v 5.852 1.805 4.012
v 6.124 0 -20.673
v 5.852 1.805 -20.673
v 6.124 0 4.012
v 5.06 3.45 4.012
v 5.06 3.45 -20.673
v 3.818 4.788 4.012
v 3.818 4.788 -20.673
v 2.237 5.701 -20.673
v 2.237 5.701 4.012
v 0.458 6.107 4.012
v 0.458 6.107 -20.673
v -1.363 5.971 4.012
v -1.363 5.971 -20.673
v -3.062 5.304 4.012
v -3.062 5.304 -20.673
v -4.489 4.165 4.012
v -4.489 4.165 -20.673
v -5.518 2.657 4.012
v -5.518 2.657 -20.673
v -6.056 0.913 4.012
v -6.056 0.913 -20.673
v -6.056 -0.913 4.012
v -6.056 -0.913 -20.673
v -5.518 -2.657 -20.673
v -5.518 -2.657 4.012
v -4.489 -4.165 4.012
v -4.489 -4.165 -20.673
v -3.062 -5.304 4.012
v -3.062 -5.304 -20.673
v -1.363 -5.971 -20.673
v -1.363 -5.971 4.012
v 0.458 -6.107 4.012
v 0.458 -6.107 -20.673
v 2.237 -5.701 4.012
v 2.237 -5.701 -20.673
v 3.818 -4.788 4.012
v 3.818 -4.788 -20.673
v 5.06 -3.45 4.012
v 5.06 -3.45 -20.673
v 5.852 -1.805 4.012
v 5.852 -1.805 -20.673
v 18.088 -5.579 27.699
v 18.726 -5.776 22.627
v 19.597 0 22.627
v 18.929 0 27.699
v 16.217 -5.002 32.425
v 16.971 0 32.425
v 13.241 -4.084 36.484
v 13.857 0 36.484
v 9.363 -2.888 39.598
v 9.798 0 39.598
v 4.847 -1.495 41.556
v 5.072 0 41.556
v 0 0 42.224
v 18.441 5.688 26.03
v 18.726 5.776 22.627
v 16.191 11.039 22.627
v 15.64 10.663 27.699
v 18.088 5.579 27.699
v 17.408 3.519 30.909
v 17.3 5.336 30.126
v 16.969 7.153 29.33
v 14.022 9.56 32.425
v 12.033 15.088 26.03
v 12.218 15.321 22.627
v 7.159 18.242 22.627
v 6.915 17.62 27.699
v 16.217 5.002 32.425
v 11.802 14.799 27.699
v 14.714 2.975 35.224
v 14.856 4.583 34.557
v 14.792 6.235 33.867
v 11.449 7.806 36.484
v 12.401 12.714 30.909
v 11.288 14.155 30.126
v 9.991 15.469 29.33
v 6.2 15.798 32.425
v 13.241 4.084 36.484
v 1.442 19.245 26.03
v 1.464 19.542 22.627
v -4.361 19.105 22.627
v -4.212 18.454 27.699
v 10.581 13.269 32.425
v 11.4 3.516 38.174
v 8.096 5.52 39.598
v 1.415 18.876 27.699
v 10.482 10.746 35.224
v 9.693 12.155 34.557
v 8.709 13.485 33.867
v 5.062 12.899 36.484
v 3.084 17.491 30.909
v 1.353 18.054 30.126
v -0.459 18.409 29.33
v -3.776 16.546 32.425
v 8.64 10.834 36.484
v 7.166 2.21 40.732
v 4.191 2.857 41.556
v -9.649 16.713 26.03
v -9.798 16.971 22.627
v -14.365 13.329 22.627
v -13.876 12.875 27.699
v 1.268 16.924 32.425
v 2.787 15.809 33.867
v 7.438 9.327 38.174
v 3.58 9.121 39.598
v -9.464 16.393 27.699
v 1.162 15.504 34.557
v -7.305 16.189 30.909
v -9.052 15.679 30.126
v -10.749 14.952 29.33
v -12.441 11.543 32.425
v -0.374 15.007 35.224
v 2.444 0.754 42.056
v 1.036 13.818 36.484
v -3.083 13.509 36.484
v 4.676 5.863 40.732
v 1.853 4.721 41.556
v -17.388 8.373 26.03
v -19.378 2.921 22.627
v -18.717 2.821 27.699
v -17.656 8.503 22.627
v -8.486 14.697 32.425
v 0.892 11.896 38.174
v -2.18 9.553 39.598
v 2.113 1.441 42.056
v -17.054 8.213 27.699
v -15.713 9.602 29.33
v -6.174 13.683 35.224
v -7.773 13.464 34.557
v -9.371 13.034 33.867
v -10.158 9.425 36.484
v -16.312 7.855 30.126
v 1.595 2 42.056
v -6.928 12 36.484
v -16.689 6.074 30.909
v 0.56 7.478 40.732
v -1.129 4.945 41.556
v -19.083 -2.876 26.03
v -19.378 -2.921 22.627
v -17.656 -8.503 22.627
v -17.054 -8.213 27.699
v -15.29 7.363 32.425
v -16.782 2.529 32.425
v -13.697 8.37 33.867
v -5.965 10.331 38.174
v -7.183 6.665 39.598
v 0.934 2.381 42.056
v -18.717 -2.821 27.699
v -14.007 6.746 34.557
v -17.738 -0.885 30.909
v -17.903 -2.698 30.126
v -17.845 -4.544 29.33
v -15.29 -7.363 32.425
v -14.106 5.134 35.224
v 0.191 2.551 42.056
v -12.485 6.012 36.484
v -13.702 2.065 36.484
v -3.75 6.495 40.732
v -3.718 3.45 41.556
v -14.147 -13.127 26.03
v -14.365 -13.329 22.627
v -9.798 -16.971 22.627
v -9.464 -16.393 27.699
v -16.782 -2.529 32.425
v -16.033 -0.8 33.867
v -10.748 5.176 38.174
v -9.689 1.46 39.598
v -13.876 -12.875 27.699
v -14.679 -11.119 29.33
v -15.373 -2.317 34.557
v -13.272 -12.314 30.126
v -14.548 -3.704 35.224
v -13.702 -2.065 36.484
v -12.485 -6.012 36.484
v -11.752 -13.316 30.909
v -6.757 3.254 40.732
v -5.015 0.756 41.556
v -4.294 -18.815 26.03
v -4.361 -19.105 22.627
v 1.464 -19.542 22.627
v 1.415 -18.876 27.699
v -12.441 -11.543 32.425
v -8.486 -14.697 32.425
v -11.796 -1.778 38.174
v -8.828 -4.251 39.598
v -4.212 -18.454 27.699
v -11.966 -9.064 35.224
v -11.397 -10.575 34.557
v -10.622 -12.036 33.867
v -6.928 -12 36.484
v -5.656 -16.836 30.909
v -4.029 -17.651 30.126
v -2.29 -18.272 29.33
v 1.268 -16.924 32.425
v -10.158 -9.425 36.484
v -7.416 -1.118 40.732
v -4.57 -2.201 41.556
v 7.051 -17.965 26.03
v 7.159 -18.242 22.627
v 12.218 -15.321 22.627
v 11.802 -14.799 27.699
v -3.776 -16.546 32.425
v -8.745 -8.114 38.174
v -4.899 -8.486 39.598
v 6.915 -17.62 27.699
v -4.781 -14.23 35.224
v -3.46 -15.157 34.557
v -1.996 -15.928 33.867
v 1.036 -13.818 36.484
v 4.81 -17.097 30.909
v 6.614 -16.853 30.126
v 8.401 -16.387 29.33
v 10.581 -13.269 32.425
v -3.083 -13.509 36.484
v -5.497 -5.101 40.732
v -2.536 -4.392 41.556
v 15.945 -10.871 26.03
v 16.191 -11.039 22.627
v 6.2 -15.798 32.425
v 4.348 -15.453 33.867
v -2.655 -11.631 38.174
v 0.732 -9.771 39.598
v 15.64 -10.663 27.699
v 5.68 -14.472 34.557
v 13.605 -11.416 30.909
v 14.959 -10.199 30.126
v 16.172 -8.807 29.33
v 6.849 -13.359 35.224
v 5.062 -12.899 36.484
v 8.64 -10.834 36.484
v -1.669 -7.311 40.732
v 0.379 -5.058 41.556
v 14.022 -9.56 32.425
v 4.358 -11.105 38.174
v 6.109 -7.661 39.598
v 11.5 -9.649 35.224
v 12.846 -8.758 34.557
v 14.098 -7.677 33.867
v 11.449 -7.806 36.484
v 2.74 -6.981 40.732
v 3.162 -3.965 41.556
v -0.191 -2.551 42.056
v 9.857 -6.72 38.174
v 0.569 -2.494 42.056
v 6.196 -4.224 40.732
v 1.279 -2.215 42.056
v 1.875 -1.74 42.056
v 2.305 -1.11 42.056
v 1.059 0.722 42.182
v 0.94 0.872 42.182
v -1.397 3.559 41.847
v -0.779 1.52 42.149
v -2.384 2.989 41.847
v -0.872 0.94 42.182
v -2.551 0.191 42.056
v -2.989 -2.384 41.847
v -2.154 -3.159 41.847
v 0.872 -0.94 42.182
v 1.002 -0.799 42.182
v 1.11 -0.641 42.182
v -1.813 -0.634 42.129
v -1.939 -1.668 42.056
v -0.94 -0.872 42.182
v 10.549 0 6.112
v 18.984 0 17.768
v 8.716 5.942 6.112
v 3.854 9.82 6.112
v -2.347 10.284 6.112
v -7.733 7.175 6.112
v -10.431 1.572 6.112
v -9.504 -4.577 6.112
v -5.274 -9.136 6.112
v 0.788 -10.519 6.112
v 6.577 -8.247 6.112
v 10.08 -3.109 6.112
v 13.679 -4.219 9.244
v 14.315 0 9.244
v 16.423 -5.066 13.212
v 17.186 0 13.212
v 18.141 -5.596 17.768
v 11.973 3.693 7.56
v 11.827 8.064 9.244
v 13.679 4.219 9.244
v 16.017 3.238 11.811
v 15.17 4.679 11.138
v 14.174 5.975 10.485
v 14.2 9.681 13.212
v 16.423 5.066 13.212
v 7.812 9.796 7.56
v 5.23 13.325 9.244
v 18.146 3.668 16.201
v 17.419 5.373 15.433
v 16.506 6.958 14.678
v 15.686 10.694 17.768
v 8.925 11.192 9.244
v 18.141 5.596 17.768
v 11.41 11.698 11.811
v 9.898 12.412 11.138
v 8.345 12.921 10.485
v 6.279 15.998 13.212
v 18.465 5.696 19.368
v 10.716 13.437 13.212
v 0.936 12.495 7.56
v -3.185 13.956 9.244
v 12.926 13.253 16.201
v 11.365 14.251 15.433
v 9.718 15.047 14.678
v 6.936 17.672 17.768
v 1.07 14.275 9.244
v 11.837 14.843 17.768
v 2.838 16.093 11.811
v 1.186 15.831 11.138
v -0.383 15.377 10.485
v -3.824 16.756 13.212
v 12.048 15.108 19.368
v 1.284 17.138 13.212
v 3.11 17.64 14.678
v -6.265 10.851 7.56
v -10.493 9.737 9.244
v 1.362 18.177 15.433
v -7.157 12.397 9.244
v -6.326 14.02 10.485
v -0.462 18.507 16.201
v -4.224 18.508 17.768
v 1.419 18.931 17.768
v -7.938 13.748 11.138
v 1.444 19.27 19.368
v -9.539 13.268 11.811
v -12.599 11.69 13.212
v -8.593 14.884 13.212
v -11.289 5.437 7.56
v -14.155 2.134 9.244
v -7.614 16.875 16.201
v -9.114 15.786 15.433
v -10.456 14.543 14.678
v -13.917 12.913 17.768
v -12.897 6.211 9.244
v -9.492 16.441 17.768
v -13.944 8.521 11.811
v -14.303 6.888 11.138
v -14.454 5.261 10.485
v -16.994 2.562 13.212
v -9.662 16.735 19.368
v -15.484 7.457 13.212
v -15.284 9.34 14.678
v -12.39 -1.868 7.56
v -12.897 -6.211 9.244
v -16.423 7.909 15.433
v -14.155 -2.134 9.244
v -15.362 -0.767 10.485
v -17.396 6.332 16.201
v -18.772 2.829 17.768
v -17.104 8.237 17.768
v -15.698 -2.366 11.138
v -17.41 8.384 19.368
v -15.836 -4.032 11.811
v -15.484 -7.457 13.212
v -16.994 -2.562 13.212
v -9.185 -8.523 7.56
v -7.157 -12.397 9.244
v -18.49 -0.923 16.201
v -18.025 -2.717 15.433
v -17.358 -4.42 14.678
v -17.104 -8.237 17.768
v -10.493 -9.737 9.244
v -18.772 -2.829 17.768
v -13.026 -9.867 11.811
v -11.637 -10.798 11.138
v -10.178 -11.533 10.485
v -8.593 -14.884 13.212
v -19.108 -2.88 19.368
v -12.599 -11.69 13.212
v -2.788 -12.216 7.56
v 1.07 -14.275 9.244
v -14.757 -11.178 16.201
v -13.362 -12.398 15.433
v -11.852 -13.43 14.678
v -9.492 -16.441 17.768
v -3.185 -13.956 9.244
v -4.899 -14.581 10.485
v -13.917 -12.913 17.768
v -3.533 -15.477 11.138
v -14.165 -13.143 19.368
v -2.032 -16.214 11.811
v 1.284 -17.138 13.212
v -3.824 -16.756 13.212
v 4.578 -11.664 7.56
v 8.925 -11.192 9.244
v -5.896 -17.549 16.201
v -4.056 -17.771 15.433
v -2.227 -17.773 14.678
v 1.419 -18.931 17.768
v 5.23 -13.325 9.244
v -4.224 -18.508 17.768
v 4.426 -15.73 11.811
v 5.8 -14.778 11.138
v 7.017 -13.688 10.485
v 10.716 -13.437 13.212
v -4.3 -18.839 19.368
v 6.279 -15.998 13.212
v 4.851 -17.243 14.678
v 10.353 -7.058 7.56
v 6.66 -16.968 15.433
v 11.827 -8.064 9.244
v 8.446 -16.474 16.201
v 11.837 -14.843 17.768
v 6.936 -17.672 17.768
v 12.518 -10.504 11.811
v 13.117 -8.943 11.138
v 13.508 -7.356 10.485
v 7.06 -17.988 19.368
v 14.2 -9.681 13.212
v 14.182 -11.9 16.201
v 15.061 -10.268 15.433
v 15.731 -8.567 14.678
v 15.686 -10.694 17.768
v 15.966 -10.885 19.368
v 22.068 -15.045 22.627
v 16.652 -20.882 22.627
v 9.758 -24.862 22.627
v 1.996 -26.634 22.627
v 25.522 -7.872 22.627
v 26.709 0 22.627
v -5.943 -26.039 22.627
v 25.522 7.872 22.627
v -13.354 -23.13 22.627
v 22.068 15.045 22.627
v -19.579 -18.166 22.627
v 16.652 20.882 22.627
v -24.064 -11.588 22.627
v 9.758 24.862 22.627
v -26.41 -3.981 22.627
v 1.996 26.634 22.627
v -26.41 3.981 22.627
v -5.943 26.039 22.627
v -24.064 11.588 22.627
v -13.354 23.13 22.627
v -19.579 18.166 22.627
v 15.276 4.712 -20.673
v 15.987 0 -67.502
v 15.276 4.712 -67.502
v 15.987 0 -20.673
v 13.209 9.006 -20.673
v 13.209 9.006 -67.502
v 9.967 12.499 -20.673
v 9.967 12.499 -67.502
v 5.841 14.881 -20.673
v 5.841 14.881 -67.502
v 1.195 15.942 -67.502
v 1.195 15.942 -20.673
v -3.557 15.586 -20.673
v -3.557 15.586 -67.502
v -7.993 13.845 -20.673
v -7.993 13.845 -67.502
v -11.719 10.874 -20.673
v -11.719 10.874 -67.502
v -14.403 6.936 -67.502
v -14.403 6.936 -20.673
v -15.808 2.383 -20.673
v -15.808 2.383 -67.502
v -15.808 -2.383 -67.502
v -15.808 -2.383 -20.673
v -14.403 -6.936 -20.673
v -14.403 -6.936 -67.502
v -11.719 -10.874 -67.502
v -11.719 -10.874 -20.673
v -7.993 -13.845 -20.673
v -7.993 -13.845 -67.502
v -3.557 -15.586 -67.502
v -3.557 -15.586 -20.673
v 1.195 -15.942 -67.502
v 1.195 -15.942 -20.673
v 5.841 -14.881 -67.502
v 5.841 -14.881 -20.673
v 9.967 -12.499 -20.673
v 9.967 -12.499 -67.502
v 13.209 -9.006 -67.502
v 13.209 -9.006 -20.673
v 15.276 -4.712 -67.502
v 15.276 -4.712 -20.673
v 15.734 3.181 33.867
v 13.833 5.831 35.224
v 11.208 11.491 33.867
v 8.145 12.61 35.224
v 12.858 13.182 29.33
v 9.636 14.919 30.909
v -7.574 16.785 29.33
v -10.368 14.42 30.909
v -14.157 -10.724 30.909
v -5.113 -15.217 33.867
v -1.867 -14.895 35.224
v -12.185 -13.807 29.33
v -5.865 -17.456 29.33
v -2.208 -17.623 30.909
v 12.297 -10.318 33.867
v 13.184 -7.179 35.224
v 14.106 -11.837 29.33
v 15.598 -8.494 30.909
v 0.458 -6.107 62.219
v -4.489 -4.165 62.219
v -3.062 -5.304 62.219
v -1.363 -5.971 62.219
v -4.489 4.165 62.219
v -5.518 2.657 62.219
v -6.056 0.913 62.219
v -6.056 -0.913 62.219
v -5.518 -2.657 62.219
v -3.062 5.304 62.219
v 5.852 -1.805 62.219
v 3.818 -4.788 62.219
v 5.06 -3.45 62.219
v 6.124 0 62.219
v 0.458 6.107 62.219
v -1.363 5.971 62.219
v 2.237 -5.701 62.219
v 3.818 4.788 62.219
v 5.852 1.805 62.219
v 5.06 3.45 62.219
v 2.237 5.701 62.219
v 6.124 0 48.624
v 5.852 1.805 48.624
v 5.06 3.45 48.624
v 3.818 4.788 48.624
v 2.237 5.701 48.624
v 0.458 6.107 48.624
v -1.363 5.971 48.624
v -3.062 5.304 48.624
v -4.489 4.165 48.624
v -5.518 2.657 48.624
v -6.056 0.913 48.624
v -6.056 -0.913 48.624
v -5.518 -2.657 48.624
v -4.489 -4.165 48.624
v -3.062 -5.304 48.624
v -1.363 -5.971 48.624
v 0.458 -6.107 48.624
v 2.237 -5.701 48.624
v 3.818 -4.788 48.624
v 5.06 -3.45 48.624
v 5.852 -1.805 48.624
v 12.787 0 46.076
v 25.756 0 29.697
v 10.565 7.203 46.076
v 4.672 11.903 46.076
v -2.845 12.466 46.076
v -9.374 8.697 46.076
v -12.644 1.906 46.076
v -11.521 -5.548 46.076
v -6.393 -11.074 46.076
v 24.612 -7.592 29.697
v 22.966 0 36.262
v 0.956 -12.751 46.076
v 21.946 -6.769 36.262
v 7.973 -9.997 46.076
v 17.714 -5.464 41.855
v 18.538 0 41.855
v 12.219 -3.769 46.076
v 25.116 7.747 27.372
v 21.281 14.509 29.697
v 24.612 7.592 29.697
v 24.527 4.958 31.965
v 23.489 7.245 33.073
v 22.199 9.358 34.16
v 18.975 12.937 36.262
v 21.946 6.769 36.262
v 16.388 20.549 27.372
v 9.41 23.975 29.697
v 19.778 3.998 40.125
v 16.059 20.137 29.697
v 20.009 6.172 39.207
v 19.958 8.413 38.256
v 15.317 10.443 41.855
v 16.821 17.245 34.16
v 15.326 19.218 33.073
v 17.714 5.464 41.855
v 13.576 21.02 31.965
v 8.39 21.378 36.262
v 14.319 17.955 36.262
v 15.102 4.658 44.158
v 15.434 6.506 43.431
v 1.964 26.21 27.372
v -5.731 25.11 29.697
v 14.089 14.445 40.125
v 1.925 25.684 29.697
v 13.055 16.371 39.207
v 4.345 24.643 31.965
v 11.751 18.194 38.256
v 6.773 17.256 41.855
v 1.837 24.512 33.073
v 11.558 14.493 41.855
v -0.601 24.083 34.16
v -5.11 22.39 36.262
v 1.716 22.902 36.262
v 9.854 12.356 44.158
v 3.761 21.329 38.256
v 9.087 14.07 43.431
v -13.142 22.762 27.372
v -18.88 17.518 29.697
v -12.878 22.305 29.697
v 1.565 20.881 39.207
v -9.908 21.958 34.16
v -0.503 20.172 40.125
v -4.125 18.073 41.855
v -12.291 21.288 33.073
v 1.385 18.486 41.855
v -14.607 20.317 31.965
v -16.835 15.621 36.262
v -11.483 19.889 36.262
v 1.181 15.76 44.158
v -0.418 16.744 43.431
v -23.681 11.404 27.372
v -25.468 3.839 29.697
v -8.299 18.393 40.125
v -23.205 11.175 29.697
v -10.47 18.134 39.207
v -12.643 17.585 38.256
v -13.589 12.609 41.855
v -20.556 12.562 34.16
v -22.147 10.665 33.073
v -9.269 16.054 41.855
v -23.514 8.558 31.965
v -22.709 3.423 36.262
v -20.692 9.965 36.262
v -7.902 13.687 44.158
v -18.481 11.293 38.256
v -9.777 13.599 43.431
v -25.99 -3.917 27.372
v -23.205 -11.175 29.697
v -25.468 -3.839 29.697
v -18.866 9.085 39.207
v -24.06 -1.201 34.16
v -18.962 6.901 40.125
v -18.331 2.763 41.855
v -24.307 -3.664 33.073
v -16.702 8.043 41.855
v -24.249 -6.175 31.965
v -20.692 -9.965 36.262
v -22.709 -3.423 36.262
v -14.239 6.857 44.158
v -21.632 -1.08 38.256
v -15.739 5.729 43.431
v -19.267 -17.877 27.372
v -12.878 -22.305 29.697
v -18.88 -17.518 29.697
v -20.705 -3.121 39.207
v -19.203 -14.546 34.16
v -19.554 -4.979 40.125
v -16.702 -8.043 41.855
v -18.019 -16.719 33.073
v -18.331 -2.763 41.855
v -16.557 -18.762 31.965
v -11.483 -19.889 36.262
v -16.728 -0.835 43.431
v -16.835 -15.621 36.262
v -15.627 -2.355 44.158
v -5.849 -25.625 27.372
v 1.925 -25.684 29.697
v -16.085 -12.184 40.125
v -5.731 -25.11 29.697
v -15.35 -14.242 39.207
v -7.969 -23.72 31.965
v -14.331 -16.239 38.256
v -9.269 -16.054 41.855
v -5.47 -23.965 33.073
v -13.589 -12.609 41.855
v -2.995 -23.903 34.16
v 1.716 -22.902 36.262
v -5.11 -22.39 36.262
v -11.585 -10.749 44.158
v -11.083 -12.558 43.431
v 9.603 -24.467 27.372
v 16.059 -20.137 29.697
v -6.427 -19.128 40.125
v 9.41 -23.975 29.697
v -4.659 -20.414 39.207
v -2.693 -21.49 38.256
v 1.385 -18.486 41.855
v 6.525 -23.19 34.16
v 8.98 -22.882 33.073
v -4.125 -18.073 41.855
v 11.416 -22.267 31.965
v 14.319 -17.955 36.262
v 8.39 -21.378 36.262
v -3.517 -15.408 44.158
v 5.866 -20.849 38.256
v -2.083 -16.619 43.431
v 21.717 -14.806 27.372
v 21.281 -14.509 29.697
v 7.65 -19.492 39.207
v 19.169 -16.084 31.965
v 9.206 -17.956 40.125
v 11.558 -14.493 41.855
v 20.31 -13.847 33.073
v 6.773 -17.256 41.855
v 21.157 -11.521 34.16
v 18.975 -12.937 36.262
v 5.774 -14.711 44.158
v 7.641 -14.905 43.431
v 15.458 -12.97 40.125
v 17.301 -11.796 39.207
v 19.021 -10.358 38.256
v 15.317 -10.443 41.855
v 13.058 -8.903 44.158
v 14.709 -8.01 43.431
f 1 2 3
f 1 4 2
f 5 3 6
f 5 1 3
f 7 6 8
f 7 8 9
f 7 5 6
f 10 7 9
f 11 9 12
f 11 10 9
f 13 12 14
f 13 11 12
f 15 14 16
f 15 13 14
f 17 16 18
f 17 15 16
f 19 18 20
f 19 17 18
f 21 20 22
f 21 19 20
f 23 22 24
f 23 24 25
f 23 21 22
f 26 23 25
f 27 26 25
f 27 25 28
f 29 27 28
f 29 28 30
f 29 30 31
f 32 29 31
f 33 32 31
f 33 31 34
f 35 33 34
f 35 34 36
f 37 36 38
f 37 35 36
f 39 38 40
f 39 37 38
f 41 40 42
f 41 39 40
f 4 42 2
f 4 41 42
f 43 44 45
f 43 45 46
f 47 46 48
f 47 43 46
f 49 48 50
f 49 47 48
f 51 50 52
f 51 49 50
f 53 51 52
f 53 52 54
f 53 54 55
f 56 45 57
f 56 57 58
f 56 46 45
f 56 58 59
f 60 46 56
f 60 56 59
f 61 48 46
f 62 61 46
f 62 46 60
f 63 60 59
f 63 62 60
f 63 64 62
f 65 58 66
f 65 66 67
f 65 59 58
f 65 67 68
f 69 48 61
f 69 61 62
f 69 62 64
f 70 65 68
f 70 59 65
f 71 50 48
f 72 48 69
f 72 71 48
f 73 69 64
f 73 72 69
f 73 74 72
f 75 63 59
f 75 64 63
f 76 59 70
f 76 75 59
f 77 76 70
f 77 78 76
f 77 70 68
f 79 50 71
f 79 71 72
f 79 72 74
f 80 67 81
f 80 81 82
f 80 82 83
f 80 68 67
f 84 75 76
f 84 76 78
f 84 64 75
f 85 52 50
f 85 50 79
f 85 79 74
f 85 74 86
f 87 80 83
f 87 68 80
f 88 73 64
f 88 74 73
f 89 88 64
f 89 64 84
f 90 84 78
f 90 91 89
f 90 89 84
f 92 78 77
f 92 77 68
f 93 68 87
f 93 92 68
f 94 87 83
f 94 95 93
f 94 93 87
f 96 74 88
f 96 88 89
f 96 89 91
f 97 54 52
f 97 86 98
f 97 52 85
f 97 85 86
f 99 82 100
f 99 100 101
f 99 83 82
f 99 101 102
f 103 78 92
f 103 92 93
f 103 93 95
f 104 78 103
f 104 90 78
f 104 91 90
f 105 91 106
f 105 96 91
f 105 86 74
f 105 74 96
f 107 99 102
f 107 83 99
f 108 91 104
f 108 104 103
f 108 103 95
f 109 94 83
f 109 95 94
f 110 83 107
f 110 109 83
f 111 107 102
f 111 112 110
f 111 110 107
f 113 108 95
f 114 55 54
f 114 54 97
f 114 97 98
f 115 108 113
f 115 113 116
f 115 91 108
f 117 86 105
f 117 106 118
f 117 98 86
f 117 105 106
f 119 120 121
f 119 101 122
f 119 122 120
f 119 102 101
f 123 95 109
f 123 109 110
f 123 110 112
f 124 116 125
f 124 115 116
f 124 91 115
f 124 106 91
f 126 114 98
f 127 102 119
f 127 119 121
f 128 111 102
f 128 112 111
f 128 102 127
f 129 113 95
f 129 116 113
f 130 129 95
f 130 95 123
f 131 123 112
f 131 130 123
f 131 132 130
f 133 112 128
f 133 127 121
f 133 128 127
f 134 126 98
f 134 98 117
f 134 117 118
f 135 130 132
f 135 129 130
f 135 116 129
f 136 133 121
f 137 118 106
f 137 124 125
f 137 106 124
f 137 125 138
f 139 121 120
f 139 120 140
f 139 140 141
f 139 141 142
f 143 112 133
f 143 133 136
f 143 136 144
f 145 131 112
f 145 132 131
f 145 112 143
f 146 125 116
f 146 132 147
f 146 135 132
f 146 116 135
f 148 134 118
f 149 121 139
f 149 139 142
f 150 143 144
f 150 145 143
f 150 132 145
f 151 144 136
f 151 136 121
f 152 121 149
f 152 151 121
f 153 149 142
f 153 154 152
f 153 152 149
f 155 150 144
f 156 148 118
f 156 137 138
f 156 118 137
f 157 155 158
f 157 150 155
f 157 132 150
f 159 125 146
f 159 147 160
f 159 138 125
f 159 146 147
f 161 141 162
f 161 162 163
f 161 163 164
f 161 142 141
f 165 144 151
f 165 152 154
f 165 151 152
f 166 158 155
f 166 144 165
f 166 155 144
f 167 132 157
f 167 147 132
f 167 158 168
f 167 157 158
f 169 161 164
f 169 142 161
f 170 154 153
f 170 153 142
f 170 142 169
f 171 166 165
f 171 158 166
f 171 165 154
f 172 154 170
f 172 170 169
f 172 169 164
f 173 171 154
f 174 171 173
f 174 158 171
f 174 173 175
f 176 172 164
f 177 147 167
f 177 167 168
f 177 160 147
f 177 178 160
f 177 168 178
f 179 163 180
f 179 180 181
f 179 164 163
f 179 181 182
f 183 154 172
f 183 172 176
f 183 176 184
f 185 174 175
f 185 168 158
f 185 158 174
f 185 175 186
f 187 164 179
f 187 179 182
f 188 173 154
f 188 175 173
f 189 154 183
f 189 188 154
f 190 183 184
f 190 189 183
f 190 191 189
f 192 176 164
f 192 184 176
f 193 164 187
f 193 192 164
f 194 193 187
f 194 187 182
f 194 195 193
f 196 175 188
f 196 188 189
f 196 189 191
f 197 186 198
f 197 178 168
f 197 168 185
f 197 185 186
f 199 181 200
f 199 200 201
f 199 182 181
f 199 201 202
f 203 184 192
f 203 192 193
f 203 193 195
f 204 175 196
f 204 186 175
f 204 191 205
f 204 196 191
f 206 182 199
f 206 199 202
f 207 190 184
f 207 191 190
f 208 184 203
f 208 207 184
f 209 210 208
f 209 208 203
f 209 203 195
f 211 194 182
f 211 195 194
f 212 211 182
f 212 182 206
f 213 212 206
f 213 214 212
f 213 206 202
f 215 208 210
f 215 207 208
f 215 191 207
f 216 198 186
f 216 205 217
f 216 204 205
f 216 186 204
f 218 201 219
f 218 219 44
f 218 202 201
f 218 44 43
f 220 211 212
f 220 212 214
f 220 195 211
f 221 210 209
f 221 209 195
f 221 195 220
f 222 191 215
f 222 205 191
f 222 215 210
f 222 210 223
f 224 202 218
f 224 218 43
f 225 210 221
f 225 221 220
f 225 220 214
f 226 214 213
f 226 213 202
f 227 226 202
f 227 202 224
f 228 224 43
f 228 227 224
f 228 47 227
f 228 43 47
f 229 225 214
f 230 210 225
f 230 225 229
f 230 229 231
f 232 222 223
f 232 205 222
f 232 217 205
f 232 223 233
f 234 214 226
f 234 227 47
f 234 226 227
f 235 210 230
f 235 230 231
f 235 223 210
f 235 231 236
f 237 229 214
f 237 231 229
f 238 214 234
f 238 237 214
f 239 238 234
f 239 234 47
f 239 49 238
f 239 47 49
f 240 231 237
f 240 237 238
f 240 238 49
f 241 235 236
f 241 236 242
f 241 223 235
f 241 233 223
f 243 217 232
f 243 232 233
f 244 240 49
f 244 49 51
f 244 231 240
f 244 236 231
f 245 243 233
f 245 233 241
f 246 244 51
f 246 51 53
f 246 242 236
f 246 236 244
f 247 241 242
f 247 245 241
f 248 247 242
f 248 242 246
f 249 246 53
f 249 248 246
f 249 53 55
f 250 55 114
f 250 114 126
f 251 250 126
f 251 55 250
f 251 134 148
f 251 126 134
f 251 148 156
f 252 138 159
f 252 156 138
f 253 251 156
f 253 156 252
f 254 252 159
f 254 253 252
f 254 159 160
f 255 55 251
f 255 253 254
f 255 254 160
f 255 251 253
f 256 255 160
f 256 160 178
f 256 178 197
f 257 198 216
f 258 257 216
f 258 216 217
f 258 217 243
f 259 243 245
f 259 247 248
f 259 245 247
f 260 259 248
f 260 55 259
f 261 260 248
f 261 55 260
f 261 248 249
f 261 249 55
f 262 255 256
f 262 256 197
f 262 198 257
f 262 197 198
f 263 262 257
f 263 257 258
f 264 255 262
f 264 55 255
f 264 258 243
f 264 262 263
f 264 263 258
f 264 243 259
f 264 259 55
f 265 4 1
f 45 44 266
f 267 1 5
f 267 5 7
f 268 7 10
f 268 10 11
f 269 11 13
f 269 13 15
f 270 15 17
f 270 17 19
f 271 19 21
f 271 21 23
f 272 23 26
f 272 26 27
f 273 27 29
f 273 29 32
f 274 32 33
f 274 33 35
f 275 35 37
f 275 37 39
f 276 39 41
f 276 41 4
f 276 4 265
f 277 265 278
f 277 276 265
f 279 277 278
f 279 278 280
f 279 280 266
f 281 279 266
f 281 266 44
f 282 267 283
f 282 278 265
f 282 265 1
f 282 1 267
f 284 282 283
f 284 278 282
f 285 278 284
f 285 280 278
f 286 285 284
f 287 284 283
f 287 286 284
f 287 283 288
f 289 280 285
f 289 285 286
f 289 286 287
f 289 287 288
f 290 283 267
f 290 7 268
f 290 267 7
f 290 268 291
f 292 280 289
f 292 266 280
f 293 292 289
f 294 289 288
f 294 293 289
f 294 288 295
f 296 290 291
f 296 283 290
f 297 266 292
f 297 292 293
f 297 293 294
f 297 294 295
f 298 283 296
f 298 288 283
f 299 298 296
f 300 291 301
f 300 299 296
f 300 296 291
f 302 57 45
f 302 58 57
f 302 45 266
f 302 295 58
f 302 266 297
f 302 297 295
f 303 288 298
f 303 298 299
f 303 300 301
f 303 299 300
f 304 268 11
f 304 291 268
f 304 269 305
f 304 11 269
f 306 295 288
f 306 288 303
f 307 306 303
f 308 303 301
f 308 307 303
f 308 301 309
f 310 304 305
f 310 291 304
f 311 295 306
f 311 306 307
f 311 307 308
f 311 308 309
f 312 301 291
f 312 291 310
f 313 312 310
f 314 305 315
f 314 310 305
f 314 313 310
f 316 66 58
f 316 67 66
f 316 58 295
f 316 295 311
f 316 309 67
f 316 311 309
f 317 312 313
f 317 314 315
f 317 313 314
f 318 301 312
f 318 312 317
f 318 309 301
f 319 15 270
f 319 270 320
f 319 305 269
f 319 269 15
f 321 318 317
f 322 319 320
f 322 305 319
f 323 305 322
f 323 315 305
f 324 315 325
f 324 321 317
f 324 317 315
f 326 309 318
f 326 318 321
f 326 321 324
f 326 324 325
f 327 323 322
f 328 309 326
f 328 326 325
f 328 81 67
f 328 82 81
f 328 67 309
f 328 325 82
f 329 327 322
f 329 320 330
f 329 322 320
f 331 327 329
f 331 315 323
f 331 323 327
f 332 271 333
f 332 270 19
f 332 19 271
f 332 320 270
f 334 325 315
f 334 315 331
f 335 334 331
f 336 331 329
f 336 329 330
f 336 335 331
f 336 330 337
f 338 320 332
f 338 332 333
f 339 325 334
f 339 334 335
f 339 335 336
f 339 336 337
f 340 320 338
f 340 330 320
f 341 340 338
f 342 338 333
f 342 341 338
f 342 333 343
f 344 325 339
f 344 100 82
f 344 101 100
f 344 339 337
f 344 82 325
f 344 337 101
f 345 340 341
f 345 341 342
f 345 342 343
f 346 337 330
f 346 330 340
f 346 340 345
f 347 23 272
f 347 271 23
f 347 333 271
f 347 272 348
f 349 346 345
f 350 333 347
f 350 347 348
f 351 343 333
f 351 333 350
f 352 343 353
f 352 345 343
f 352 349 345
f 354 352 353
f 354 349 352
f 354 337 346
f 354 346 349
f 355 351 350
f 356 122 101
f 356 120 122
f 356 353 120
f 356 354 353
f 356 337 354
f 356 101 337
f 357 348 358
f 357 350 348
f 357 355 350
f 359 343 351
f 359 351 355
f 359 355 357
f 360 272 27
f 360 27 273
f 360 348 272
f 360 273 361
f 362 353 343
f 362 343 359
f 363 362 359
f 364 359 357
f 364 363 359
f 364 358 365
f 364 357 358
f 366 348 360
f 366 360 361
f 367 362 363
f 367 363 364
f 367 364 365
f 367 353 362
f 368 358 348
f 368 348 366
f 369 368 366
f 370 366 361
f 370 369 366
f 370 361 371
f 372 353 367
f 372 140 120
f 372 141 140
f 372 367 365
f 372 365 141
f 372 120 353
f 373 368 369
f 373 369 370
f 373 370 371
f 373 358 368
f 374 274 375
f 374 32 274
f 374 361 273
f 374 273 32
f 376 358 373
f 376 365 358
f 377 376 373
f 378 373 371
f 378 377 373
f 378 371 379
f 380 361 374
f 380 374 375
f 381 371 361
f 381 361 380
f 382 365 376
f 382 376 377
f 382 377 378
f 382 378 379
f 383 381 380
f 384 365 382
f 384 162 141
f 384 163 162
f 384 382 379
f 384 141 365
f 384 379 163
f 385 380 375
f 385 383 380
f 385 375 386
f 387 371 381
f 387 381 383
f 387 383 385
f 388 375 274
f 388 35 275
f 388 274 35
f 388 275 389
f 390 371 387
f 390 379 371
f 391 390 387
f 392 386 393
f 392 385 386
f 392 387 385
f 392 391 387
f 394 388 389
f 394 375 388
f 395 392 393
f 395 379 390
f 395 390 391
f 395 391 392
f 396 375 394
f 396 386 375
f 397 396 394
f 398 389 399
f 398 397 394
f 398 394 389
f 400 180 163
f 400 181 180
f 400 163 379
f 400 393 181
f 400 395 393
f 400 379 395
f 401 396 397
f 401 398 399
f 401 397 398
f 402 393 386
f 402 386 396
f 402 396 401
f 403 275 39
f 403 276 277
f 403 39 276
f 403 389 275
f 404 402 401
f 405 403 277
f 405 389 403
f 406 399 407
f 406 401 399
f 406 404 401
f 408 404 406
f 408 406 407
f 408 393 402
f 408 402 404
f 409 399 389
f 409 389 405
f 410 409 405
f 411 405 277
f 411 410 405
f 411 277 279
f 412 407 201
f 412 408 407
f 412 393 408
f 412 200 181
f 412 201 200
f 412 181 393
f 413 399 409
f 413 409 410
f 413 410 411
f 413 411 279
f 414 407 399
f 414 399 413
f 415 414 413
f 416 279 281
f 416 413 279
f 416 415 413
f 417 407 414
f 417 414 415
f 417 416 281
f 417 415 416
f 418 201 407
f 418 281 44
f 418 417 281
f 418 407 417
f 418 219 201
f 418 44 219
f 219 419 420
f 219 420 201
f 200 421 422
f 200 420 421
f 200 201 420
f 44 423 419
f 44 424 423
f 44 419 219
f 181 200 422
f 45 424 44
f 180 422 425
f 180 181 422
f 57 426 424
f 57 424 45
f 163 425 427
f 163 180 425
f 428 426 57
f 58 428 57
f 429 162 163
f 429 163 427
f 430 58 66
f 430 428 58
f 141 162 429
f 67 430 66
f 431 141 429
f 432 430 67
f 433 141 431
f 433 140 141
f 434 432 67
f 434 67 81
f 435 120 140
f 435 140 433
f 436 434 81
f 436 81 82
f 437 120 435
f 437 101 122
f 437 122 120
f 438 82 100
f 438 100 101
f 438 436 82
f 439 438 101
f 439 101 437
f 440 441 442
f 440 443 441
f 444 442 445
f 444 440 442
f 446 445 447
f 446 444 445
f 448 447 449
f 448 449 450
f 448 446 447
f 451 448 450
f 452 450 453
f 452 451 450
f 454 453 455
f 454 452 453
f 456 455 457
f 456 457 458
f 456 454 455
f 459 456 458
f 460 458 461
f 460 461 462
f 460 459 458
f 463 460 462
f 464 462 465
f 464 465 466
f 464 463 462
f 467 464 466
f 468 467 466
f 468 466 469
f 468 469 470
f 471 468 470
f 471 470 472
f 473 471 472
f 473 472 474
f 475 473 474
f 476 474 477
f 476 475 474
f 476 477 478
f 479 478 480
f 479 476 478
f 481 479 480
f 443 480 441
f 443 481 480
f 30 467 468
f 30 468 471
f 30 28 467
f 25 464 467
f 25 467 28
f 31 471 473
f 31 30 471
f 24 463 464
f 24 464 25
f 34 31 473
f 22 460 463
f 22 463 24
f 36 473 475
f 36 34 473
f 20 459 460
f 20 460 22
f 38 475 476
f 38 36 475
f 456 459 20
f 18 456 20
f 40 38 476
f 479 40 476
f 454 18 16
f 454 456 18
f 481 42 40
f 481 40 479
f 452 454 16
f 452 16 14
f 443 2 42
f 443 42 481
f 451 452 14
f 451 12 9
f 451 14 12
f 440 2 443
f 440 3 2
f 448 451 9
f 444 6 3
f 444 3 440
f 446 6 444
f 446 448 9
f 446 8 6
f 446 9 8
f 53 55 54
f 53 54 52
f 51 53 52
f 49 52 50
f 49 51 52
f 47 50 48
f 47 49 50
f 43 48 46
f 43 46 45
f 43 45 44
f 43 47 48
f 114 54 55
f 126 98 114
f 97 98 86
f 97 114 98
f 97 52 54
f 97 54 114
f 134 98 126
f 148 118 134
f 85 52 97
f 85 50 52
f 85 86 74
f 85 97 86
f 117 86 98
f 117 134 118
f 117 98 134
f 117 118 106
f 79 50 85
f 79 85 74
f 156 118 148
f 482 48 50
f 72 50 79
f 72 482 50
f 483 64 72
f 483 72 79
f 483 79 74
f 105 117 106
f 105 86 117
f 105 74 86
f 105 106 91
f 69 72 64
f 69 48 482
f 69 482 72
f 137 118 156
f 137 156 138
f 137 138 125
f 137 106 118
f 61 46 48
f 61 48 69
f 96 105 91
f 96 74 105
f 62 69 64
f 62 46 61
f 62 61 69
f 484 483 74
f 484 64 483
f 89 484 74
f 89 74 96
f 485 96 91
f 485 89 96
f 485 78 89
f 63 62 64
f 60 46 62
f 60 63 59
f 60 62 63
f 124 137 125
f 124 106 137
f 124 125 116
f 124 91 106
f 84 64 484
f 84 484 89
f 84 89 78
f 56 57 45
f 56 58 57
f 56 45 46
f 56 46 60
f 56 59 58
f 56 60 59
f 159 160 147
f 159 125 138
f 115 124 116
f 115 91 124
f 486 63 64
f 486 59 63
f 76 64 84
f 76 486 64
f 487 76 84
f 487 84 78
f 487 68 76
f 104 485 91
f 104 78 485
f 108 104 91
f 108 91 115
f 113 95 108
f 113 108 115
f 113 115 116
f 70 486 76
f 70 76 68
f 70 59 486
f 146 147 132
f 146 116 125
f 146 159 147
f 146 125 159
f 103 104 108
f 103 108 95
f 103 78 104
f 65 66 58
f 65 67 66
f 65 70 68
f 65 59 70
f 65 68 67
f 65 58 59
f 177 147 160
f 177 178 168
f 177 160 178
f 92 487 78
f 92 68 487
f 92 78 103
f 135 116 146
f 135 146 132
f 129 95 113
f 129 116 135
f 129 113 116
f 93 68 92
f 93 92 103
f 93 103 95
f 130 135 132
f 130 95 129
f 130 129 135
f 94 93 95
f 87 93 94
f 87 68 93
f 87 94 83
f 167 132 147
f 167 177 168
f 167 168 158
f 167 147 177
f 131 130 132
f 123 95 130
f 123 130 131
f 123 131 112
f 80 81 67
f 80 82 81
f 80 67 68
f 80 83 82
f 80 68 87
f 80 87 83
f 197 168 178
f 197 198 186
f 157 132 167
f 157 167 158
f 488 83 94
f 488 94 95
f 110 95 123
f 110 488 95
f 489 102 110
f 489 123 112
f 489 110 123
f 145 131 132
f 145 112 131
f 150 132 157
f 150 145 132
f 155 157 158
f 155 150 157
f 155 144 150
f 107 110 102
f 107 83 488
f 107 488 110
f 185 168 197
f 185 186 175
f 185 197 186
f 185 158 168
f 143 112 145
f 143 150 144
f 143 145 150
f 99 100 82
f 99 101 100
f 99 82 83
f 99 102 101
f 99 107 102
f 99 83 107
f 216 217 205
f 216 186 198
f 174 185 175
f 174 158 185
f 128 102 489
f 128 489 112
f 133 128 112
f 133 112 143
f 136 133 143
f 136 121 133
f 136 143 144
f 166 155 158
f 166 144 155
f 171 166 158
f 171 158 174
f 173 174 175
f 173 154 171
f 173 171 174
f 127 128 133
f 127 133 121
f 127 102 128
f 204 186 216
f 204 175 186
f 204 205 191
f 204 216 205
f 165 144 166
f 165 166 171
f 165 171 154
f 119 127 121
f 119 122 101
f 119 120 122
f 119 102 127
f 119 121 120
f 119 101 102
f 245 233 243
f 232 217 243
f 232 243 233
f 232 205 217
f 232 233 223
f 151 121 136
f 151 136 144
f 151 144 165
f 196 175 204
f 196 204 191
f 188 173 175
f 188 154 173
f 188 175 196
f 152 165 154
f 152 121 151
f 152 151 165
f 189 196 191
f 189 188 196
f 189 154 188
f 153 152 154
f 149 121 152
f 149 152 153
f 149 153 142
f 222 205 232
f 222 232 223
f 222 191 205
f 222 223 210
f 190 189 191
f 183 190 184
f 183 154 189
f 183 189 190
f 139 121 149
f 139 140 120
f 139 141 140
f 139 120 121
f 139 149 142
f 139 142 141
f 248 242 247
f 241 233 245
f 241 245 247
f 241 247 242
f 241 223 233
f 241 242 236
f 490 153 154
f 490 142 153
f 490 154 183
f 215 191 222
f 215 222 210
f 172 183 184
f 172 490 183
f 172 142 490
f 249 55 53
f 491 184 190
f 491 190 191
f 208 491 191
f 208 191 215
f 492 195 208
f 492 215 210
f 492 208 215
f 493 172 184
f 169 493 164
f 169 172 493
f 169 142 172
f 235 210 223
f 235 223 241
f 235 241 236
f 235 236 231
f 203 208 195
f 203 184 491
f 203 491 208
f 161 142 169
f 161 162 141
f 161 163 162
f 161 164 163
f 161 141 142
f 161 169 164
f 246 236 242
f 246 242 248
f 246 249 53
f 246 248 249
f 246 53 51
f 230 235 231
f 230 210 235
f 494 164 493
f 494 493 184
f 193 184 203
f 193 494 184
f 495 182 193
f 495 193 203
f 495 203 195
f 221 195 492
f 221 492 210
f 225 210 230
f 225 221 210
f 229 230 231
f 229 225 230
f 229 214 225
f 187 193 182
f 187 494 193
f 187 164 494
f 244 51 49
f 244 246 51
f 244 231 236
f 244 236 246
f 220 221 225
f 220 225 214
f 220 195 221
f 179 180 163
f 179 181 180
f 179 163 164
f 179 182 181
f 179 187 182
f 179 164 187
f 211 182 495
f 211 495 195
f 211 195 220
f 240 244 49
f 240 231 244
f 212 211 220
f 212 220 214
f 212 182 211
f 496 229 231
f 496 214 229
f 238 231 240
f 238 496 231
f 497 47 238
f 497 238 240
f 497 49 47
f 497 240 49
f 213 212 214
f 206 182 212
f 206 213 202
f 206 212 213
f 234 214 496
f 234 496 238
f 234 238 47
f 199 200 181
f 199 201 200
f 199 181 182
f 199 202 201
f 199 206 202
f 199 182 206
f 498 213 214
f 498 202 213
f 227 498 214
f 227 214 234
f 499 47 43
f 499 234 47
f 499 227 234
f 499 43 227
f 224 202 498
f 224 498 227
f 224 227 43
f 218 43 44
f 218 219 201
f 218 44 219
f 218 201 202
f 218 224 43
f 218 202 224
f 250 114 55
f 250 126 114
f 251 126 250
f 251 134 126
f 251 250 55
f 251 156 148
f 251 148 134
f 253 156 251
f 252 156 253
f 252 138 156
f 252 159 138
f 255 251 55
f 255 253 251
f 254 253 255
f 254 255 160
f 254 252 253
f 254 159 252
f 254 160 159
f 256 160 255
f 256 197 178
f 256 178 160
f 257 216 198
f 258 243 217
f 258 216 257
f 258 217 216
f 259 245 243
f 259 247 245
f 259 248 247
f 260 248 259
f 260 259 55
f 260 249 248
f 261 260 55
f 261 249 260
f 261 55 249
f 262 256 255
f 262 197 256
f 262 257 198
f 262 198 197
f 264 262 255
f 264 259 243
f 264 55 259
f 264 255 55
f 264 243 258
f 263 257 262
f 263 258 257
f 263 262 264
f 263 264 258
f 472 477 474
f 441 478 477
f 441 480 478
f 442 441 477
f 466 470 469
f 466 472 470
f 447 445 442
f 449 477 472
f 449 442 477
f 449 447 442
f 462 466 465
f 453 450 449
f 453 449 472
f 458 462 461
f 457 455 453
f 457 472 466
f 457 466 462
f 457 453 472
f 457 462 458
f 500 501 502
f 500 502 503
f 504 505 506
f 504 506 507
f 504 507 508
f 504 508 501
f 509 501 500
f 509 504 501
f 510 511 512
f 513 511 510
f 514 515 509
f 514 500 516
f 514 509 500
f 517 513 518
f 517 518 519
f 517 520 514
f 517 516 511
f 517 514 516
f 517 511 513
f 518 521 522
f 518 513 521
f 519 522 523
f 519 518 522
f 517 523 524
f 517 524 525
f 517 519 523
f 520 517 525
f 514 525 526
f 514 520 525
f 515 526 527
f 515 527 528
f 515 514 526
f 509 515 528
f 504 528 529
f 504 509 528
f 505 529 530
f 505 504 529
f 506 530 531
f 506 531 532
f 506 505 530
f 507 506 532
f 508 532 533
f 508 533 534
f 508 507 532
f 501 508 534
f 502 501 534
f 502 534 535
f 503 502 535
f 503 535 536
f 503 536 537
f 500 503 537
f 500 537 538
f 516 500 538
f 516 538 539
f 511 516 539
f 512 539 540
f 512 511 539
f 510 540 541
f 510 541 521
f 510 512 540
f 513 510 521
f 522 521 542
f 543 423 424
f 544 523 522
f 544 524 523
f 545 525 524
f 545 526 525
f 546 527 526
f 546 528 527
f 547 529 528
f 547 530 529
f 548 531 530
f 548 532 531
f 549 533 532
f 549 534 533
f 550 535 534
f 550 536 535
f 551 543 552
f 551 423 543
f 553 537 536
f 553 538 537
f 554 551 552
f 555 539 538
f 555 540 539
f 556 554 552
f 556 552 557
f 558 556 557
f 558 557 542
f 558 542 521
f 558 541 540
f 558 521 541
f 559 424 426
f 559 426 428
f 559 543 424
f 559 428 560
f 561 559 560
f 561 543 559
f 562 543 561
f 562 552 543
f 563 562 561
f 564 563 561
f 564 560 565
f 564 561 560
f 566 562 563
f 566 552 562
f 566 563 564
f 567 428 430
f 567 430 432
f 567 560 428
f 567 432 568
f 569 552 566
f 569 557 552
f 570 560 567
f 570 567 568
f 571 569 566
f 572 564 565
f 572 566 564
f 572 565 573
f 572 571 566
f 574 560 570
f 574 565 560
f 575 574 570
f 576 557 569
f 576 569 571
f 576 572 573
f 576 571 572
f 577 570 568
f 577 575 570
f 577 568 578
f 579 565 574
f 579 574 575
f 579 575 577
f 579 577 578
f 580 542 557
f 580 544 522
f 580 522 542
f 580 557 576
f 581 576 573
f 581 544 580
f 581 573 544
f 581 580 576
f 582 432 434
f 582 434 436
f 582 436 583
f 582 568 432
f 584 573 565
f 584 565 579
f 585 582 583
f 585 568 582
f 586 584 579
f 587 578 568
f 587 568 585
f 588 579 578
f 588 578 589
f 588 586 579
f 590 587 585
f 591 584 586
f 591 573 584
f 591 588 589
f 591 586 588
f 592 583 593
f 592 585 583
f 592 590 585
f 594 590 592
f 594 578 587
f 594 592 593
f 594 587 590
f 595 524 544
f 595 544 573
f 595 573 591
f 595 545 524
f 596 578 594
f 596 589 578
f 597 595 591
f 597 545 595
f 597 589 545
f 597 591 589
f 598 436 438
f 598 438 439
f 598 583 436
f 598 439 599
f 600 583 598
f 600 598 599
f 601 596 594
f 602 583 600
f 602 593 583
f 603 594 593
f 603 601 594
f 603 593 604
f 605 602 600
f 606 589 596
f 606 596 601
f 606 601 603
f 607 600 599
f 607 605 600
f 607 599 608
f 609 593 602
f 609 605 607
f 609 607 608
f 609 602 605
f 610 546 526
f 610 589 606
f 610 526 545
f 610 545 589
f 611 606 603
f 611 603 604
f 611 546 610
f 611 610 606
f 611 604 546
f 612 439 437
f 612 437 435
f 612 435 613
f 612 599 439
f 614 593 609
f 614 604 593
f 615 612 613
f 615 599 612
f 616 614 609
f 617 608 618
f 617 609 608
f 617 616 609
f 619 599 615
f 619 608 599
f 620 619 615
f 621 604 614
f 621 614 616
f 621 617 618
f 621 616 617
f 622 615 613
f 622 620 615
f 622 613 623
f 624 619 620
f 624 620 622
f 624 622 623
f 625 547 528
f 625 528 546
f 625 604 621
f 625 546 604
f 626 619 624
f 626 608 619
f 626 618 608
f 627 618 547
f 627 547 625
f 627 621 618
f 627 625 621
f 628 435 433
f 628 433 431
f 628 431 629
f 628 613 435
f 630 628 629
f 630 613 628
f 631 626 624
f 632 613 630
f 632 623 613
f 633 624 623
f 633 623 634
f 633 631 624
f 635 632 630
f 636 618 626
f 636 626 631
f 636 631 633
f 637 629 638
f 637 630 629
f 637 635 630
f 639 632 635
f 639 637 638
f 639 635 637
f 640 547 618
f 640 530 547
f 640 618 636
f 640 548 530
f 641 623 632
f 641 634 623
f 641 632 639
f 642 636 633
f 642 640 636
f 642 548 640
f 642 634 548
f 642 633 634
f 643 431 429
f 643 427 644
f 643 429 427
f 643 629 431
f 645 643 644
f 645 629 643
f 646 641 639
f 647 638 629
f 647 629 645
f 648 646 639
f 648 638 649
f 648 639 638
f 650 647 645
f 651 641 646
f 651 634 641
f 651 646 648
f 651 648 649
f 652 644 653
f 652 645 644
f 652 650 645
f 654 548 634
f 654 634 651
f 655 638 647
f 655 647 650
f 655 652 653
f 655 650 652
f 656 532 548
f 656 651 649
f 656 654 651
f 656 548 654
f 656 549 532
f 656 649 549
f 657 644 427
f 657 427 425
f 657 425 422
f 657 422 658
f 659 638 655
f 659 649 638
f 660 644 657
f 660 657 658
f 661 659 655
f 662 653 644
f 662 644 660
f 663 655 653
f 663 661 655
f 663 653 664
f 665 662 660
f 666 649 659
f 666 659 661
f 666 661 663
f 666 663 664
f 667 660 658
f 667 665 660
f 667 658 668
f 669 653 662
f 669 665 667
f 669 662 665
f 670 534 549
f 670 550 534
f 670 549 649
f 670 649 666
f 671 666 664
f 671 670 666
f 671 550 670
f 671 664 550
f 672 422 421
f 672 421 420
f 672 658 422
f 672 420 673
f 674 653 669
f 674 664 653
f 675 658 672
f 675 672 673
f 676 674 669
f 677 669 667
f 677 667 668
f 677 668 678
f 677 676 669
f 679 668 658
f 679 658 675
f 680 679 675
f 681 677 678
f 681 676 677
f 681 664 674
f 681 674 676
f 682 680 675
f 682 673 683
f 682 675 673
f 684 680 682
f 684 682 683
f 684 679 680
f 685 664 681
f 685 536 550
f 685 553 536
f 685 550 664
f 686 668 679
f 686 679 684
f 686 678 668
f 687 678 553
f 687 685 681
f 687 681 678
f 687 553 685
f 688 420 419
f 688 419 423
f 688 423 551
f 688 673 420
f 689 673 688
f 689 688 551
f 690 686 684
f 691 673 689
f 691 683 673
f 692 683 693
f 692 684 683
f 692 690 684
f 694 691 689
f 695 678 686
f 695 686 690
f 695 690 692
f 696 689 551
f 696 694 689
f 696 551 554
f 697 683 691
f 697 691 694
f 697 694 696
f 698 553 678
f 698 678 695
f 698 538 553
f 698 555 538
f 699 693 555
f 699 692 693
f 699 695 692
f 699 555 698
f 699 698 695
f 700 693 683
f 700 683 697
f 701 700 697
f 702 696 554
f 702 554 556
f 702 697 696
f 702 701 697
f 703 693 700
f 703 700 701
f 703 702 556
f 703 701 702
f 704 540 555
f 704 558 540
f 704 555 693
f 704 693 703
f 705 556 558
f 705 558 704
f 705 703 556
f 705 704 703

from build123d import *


with BuildPart() as f1:
    # F0 (on Front) → F1 (revolve)
    with BuildSketch(Plane.XZ):
        with BuildLine():
            Line((6.124114, -20.673078), (6.124114, 4.012086))
            ThreePointArc((6.124114, 4.012086), (15.875068, 11.137714), (19.596534, 22.627117))
            ThreePointArc((19.596534, 22.627117), (13.856842, 36.483959), (0, 42.223651))
            Line((0, 42.223651), (0, -67.502365))
            Line((0, -67.502365), (15.986569, -67.502365))
            Line((15.986569, -67.502365), (15.986569, -20.673078))
            Line((15.986569, -20.673078), (6.124114, -20.673078))
        make_face()
    revolve(axis=Axis((0, 0, -12.639357), (0, 0, 1)))


with BuildPart() as f2:
    # F0 (on Front) → F2 (revolve)
    with BuildSketch(Plane.XZ):
        with BuildLine():
            ThreePointArc((0, 42.223651), (13.856842, 36.483959), (19.596534, 22.627117))
            Line((19.596534, 22.627117), (26.708534, 22.627117))
            ThreePointArc((26.708534, 22.627117), (20.93934, 39.206919), (6.124114, 48.62406))
            Line((6.124114, 48.62406), (6.124114, 62.219013))
            Line((6.124114, 62.219013), (0, 62.219013))
            Line((0, 62.219013), (0, 49.335651))
            Line((0, 49.335651), (0, 42.223651))
        make_face()
    revolve(axis=Axis((0, 0, 45.779651), (0, 0, 1)))


solid = Compound([f1.part, f2.part])
